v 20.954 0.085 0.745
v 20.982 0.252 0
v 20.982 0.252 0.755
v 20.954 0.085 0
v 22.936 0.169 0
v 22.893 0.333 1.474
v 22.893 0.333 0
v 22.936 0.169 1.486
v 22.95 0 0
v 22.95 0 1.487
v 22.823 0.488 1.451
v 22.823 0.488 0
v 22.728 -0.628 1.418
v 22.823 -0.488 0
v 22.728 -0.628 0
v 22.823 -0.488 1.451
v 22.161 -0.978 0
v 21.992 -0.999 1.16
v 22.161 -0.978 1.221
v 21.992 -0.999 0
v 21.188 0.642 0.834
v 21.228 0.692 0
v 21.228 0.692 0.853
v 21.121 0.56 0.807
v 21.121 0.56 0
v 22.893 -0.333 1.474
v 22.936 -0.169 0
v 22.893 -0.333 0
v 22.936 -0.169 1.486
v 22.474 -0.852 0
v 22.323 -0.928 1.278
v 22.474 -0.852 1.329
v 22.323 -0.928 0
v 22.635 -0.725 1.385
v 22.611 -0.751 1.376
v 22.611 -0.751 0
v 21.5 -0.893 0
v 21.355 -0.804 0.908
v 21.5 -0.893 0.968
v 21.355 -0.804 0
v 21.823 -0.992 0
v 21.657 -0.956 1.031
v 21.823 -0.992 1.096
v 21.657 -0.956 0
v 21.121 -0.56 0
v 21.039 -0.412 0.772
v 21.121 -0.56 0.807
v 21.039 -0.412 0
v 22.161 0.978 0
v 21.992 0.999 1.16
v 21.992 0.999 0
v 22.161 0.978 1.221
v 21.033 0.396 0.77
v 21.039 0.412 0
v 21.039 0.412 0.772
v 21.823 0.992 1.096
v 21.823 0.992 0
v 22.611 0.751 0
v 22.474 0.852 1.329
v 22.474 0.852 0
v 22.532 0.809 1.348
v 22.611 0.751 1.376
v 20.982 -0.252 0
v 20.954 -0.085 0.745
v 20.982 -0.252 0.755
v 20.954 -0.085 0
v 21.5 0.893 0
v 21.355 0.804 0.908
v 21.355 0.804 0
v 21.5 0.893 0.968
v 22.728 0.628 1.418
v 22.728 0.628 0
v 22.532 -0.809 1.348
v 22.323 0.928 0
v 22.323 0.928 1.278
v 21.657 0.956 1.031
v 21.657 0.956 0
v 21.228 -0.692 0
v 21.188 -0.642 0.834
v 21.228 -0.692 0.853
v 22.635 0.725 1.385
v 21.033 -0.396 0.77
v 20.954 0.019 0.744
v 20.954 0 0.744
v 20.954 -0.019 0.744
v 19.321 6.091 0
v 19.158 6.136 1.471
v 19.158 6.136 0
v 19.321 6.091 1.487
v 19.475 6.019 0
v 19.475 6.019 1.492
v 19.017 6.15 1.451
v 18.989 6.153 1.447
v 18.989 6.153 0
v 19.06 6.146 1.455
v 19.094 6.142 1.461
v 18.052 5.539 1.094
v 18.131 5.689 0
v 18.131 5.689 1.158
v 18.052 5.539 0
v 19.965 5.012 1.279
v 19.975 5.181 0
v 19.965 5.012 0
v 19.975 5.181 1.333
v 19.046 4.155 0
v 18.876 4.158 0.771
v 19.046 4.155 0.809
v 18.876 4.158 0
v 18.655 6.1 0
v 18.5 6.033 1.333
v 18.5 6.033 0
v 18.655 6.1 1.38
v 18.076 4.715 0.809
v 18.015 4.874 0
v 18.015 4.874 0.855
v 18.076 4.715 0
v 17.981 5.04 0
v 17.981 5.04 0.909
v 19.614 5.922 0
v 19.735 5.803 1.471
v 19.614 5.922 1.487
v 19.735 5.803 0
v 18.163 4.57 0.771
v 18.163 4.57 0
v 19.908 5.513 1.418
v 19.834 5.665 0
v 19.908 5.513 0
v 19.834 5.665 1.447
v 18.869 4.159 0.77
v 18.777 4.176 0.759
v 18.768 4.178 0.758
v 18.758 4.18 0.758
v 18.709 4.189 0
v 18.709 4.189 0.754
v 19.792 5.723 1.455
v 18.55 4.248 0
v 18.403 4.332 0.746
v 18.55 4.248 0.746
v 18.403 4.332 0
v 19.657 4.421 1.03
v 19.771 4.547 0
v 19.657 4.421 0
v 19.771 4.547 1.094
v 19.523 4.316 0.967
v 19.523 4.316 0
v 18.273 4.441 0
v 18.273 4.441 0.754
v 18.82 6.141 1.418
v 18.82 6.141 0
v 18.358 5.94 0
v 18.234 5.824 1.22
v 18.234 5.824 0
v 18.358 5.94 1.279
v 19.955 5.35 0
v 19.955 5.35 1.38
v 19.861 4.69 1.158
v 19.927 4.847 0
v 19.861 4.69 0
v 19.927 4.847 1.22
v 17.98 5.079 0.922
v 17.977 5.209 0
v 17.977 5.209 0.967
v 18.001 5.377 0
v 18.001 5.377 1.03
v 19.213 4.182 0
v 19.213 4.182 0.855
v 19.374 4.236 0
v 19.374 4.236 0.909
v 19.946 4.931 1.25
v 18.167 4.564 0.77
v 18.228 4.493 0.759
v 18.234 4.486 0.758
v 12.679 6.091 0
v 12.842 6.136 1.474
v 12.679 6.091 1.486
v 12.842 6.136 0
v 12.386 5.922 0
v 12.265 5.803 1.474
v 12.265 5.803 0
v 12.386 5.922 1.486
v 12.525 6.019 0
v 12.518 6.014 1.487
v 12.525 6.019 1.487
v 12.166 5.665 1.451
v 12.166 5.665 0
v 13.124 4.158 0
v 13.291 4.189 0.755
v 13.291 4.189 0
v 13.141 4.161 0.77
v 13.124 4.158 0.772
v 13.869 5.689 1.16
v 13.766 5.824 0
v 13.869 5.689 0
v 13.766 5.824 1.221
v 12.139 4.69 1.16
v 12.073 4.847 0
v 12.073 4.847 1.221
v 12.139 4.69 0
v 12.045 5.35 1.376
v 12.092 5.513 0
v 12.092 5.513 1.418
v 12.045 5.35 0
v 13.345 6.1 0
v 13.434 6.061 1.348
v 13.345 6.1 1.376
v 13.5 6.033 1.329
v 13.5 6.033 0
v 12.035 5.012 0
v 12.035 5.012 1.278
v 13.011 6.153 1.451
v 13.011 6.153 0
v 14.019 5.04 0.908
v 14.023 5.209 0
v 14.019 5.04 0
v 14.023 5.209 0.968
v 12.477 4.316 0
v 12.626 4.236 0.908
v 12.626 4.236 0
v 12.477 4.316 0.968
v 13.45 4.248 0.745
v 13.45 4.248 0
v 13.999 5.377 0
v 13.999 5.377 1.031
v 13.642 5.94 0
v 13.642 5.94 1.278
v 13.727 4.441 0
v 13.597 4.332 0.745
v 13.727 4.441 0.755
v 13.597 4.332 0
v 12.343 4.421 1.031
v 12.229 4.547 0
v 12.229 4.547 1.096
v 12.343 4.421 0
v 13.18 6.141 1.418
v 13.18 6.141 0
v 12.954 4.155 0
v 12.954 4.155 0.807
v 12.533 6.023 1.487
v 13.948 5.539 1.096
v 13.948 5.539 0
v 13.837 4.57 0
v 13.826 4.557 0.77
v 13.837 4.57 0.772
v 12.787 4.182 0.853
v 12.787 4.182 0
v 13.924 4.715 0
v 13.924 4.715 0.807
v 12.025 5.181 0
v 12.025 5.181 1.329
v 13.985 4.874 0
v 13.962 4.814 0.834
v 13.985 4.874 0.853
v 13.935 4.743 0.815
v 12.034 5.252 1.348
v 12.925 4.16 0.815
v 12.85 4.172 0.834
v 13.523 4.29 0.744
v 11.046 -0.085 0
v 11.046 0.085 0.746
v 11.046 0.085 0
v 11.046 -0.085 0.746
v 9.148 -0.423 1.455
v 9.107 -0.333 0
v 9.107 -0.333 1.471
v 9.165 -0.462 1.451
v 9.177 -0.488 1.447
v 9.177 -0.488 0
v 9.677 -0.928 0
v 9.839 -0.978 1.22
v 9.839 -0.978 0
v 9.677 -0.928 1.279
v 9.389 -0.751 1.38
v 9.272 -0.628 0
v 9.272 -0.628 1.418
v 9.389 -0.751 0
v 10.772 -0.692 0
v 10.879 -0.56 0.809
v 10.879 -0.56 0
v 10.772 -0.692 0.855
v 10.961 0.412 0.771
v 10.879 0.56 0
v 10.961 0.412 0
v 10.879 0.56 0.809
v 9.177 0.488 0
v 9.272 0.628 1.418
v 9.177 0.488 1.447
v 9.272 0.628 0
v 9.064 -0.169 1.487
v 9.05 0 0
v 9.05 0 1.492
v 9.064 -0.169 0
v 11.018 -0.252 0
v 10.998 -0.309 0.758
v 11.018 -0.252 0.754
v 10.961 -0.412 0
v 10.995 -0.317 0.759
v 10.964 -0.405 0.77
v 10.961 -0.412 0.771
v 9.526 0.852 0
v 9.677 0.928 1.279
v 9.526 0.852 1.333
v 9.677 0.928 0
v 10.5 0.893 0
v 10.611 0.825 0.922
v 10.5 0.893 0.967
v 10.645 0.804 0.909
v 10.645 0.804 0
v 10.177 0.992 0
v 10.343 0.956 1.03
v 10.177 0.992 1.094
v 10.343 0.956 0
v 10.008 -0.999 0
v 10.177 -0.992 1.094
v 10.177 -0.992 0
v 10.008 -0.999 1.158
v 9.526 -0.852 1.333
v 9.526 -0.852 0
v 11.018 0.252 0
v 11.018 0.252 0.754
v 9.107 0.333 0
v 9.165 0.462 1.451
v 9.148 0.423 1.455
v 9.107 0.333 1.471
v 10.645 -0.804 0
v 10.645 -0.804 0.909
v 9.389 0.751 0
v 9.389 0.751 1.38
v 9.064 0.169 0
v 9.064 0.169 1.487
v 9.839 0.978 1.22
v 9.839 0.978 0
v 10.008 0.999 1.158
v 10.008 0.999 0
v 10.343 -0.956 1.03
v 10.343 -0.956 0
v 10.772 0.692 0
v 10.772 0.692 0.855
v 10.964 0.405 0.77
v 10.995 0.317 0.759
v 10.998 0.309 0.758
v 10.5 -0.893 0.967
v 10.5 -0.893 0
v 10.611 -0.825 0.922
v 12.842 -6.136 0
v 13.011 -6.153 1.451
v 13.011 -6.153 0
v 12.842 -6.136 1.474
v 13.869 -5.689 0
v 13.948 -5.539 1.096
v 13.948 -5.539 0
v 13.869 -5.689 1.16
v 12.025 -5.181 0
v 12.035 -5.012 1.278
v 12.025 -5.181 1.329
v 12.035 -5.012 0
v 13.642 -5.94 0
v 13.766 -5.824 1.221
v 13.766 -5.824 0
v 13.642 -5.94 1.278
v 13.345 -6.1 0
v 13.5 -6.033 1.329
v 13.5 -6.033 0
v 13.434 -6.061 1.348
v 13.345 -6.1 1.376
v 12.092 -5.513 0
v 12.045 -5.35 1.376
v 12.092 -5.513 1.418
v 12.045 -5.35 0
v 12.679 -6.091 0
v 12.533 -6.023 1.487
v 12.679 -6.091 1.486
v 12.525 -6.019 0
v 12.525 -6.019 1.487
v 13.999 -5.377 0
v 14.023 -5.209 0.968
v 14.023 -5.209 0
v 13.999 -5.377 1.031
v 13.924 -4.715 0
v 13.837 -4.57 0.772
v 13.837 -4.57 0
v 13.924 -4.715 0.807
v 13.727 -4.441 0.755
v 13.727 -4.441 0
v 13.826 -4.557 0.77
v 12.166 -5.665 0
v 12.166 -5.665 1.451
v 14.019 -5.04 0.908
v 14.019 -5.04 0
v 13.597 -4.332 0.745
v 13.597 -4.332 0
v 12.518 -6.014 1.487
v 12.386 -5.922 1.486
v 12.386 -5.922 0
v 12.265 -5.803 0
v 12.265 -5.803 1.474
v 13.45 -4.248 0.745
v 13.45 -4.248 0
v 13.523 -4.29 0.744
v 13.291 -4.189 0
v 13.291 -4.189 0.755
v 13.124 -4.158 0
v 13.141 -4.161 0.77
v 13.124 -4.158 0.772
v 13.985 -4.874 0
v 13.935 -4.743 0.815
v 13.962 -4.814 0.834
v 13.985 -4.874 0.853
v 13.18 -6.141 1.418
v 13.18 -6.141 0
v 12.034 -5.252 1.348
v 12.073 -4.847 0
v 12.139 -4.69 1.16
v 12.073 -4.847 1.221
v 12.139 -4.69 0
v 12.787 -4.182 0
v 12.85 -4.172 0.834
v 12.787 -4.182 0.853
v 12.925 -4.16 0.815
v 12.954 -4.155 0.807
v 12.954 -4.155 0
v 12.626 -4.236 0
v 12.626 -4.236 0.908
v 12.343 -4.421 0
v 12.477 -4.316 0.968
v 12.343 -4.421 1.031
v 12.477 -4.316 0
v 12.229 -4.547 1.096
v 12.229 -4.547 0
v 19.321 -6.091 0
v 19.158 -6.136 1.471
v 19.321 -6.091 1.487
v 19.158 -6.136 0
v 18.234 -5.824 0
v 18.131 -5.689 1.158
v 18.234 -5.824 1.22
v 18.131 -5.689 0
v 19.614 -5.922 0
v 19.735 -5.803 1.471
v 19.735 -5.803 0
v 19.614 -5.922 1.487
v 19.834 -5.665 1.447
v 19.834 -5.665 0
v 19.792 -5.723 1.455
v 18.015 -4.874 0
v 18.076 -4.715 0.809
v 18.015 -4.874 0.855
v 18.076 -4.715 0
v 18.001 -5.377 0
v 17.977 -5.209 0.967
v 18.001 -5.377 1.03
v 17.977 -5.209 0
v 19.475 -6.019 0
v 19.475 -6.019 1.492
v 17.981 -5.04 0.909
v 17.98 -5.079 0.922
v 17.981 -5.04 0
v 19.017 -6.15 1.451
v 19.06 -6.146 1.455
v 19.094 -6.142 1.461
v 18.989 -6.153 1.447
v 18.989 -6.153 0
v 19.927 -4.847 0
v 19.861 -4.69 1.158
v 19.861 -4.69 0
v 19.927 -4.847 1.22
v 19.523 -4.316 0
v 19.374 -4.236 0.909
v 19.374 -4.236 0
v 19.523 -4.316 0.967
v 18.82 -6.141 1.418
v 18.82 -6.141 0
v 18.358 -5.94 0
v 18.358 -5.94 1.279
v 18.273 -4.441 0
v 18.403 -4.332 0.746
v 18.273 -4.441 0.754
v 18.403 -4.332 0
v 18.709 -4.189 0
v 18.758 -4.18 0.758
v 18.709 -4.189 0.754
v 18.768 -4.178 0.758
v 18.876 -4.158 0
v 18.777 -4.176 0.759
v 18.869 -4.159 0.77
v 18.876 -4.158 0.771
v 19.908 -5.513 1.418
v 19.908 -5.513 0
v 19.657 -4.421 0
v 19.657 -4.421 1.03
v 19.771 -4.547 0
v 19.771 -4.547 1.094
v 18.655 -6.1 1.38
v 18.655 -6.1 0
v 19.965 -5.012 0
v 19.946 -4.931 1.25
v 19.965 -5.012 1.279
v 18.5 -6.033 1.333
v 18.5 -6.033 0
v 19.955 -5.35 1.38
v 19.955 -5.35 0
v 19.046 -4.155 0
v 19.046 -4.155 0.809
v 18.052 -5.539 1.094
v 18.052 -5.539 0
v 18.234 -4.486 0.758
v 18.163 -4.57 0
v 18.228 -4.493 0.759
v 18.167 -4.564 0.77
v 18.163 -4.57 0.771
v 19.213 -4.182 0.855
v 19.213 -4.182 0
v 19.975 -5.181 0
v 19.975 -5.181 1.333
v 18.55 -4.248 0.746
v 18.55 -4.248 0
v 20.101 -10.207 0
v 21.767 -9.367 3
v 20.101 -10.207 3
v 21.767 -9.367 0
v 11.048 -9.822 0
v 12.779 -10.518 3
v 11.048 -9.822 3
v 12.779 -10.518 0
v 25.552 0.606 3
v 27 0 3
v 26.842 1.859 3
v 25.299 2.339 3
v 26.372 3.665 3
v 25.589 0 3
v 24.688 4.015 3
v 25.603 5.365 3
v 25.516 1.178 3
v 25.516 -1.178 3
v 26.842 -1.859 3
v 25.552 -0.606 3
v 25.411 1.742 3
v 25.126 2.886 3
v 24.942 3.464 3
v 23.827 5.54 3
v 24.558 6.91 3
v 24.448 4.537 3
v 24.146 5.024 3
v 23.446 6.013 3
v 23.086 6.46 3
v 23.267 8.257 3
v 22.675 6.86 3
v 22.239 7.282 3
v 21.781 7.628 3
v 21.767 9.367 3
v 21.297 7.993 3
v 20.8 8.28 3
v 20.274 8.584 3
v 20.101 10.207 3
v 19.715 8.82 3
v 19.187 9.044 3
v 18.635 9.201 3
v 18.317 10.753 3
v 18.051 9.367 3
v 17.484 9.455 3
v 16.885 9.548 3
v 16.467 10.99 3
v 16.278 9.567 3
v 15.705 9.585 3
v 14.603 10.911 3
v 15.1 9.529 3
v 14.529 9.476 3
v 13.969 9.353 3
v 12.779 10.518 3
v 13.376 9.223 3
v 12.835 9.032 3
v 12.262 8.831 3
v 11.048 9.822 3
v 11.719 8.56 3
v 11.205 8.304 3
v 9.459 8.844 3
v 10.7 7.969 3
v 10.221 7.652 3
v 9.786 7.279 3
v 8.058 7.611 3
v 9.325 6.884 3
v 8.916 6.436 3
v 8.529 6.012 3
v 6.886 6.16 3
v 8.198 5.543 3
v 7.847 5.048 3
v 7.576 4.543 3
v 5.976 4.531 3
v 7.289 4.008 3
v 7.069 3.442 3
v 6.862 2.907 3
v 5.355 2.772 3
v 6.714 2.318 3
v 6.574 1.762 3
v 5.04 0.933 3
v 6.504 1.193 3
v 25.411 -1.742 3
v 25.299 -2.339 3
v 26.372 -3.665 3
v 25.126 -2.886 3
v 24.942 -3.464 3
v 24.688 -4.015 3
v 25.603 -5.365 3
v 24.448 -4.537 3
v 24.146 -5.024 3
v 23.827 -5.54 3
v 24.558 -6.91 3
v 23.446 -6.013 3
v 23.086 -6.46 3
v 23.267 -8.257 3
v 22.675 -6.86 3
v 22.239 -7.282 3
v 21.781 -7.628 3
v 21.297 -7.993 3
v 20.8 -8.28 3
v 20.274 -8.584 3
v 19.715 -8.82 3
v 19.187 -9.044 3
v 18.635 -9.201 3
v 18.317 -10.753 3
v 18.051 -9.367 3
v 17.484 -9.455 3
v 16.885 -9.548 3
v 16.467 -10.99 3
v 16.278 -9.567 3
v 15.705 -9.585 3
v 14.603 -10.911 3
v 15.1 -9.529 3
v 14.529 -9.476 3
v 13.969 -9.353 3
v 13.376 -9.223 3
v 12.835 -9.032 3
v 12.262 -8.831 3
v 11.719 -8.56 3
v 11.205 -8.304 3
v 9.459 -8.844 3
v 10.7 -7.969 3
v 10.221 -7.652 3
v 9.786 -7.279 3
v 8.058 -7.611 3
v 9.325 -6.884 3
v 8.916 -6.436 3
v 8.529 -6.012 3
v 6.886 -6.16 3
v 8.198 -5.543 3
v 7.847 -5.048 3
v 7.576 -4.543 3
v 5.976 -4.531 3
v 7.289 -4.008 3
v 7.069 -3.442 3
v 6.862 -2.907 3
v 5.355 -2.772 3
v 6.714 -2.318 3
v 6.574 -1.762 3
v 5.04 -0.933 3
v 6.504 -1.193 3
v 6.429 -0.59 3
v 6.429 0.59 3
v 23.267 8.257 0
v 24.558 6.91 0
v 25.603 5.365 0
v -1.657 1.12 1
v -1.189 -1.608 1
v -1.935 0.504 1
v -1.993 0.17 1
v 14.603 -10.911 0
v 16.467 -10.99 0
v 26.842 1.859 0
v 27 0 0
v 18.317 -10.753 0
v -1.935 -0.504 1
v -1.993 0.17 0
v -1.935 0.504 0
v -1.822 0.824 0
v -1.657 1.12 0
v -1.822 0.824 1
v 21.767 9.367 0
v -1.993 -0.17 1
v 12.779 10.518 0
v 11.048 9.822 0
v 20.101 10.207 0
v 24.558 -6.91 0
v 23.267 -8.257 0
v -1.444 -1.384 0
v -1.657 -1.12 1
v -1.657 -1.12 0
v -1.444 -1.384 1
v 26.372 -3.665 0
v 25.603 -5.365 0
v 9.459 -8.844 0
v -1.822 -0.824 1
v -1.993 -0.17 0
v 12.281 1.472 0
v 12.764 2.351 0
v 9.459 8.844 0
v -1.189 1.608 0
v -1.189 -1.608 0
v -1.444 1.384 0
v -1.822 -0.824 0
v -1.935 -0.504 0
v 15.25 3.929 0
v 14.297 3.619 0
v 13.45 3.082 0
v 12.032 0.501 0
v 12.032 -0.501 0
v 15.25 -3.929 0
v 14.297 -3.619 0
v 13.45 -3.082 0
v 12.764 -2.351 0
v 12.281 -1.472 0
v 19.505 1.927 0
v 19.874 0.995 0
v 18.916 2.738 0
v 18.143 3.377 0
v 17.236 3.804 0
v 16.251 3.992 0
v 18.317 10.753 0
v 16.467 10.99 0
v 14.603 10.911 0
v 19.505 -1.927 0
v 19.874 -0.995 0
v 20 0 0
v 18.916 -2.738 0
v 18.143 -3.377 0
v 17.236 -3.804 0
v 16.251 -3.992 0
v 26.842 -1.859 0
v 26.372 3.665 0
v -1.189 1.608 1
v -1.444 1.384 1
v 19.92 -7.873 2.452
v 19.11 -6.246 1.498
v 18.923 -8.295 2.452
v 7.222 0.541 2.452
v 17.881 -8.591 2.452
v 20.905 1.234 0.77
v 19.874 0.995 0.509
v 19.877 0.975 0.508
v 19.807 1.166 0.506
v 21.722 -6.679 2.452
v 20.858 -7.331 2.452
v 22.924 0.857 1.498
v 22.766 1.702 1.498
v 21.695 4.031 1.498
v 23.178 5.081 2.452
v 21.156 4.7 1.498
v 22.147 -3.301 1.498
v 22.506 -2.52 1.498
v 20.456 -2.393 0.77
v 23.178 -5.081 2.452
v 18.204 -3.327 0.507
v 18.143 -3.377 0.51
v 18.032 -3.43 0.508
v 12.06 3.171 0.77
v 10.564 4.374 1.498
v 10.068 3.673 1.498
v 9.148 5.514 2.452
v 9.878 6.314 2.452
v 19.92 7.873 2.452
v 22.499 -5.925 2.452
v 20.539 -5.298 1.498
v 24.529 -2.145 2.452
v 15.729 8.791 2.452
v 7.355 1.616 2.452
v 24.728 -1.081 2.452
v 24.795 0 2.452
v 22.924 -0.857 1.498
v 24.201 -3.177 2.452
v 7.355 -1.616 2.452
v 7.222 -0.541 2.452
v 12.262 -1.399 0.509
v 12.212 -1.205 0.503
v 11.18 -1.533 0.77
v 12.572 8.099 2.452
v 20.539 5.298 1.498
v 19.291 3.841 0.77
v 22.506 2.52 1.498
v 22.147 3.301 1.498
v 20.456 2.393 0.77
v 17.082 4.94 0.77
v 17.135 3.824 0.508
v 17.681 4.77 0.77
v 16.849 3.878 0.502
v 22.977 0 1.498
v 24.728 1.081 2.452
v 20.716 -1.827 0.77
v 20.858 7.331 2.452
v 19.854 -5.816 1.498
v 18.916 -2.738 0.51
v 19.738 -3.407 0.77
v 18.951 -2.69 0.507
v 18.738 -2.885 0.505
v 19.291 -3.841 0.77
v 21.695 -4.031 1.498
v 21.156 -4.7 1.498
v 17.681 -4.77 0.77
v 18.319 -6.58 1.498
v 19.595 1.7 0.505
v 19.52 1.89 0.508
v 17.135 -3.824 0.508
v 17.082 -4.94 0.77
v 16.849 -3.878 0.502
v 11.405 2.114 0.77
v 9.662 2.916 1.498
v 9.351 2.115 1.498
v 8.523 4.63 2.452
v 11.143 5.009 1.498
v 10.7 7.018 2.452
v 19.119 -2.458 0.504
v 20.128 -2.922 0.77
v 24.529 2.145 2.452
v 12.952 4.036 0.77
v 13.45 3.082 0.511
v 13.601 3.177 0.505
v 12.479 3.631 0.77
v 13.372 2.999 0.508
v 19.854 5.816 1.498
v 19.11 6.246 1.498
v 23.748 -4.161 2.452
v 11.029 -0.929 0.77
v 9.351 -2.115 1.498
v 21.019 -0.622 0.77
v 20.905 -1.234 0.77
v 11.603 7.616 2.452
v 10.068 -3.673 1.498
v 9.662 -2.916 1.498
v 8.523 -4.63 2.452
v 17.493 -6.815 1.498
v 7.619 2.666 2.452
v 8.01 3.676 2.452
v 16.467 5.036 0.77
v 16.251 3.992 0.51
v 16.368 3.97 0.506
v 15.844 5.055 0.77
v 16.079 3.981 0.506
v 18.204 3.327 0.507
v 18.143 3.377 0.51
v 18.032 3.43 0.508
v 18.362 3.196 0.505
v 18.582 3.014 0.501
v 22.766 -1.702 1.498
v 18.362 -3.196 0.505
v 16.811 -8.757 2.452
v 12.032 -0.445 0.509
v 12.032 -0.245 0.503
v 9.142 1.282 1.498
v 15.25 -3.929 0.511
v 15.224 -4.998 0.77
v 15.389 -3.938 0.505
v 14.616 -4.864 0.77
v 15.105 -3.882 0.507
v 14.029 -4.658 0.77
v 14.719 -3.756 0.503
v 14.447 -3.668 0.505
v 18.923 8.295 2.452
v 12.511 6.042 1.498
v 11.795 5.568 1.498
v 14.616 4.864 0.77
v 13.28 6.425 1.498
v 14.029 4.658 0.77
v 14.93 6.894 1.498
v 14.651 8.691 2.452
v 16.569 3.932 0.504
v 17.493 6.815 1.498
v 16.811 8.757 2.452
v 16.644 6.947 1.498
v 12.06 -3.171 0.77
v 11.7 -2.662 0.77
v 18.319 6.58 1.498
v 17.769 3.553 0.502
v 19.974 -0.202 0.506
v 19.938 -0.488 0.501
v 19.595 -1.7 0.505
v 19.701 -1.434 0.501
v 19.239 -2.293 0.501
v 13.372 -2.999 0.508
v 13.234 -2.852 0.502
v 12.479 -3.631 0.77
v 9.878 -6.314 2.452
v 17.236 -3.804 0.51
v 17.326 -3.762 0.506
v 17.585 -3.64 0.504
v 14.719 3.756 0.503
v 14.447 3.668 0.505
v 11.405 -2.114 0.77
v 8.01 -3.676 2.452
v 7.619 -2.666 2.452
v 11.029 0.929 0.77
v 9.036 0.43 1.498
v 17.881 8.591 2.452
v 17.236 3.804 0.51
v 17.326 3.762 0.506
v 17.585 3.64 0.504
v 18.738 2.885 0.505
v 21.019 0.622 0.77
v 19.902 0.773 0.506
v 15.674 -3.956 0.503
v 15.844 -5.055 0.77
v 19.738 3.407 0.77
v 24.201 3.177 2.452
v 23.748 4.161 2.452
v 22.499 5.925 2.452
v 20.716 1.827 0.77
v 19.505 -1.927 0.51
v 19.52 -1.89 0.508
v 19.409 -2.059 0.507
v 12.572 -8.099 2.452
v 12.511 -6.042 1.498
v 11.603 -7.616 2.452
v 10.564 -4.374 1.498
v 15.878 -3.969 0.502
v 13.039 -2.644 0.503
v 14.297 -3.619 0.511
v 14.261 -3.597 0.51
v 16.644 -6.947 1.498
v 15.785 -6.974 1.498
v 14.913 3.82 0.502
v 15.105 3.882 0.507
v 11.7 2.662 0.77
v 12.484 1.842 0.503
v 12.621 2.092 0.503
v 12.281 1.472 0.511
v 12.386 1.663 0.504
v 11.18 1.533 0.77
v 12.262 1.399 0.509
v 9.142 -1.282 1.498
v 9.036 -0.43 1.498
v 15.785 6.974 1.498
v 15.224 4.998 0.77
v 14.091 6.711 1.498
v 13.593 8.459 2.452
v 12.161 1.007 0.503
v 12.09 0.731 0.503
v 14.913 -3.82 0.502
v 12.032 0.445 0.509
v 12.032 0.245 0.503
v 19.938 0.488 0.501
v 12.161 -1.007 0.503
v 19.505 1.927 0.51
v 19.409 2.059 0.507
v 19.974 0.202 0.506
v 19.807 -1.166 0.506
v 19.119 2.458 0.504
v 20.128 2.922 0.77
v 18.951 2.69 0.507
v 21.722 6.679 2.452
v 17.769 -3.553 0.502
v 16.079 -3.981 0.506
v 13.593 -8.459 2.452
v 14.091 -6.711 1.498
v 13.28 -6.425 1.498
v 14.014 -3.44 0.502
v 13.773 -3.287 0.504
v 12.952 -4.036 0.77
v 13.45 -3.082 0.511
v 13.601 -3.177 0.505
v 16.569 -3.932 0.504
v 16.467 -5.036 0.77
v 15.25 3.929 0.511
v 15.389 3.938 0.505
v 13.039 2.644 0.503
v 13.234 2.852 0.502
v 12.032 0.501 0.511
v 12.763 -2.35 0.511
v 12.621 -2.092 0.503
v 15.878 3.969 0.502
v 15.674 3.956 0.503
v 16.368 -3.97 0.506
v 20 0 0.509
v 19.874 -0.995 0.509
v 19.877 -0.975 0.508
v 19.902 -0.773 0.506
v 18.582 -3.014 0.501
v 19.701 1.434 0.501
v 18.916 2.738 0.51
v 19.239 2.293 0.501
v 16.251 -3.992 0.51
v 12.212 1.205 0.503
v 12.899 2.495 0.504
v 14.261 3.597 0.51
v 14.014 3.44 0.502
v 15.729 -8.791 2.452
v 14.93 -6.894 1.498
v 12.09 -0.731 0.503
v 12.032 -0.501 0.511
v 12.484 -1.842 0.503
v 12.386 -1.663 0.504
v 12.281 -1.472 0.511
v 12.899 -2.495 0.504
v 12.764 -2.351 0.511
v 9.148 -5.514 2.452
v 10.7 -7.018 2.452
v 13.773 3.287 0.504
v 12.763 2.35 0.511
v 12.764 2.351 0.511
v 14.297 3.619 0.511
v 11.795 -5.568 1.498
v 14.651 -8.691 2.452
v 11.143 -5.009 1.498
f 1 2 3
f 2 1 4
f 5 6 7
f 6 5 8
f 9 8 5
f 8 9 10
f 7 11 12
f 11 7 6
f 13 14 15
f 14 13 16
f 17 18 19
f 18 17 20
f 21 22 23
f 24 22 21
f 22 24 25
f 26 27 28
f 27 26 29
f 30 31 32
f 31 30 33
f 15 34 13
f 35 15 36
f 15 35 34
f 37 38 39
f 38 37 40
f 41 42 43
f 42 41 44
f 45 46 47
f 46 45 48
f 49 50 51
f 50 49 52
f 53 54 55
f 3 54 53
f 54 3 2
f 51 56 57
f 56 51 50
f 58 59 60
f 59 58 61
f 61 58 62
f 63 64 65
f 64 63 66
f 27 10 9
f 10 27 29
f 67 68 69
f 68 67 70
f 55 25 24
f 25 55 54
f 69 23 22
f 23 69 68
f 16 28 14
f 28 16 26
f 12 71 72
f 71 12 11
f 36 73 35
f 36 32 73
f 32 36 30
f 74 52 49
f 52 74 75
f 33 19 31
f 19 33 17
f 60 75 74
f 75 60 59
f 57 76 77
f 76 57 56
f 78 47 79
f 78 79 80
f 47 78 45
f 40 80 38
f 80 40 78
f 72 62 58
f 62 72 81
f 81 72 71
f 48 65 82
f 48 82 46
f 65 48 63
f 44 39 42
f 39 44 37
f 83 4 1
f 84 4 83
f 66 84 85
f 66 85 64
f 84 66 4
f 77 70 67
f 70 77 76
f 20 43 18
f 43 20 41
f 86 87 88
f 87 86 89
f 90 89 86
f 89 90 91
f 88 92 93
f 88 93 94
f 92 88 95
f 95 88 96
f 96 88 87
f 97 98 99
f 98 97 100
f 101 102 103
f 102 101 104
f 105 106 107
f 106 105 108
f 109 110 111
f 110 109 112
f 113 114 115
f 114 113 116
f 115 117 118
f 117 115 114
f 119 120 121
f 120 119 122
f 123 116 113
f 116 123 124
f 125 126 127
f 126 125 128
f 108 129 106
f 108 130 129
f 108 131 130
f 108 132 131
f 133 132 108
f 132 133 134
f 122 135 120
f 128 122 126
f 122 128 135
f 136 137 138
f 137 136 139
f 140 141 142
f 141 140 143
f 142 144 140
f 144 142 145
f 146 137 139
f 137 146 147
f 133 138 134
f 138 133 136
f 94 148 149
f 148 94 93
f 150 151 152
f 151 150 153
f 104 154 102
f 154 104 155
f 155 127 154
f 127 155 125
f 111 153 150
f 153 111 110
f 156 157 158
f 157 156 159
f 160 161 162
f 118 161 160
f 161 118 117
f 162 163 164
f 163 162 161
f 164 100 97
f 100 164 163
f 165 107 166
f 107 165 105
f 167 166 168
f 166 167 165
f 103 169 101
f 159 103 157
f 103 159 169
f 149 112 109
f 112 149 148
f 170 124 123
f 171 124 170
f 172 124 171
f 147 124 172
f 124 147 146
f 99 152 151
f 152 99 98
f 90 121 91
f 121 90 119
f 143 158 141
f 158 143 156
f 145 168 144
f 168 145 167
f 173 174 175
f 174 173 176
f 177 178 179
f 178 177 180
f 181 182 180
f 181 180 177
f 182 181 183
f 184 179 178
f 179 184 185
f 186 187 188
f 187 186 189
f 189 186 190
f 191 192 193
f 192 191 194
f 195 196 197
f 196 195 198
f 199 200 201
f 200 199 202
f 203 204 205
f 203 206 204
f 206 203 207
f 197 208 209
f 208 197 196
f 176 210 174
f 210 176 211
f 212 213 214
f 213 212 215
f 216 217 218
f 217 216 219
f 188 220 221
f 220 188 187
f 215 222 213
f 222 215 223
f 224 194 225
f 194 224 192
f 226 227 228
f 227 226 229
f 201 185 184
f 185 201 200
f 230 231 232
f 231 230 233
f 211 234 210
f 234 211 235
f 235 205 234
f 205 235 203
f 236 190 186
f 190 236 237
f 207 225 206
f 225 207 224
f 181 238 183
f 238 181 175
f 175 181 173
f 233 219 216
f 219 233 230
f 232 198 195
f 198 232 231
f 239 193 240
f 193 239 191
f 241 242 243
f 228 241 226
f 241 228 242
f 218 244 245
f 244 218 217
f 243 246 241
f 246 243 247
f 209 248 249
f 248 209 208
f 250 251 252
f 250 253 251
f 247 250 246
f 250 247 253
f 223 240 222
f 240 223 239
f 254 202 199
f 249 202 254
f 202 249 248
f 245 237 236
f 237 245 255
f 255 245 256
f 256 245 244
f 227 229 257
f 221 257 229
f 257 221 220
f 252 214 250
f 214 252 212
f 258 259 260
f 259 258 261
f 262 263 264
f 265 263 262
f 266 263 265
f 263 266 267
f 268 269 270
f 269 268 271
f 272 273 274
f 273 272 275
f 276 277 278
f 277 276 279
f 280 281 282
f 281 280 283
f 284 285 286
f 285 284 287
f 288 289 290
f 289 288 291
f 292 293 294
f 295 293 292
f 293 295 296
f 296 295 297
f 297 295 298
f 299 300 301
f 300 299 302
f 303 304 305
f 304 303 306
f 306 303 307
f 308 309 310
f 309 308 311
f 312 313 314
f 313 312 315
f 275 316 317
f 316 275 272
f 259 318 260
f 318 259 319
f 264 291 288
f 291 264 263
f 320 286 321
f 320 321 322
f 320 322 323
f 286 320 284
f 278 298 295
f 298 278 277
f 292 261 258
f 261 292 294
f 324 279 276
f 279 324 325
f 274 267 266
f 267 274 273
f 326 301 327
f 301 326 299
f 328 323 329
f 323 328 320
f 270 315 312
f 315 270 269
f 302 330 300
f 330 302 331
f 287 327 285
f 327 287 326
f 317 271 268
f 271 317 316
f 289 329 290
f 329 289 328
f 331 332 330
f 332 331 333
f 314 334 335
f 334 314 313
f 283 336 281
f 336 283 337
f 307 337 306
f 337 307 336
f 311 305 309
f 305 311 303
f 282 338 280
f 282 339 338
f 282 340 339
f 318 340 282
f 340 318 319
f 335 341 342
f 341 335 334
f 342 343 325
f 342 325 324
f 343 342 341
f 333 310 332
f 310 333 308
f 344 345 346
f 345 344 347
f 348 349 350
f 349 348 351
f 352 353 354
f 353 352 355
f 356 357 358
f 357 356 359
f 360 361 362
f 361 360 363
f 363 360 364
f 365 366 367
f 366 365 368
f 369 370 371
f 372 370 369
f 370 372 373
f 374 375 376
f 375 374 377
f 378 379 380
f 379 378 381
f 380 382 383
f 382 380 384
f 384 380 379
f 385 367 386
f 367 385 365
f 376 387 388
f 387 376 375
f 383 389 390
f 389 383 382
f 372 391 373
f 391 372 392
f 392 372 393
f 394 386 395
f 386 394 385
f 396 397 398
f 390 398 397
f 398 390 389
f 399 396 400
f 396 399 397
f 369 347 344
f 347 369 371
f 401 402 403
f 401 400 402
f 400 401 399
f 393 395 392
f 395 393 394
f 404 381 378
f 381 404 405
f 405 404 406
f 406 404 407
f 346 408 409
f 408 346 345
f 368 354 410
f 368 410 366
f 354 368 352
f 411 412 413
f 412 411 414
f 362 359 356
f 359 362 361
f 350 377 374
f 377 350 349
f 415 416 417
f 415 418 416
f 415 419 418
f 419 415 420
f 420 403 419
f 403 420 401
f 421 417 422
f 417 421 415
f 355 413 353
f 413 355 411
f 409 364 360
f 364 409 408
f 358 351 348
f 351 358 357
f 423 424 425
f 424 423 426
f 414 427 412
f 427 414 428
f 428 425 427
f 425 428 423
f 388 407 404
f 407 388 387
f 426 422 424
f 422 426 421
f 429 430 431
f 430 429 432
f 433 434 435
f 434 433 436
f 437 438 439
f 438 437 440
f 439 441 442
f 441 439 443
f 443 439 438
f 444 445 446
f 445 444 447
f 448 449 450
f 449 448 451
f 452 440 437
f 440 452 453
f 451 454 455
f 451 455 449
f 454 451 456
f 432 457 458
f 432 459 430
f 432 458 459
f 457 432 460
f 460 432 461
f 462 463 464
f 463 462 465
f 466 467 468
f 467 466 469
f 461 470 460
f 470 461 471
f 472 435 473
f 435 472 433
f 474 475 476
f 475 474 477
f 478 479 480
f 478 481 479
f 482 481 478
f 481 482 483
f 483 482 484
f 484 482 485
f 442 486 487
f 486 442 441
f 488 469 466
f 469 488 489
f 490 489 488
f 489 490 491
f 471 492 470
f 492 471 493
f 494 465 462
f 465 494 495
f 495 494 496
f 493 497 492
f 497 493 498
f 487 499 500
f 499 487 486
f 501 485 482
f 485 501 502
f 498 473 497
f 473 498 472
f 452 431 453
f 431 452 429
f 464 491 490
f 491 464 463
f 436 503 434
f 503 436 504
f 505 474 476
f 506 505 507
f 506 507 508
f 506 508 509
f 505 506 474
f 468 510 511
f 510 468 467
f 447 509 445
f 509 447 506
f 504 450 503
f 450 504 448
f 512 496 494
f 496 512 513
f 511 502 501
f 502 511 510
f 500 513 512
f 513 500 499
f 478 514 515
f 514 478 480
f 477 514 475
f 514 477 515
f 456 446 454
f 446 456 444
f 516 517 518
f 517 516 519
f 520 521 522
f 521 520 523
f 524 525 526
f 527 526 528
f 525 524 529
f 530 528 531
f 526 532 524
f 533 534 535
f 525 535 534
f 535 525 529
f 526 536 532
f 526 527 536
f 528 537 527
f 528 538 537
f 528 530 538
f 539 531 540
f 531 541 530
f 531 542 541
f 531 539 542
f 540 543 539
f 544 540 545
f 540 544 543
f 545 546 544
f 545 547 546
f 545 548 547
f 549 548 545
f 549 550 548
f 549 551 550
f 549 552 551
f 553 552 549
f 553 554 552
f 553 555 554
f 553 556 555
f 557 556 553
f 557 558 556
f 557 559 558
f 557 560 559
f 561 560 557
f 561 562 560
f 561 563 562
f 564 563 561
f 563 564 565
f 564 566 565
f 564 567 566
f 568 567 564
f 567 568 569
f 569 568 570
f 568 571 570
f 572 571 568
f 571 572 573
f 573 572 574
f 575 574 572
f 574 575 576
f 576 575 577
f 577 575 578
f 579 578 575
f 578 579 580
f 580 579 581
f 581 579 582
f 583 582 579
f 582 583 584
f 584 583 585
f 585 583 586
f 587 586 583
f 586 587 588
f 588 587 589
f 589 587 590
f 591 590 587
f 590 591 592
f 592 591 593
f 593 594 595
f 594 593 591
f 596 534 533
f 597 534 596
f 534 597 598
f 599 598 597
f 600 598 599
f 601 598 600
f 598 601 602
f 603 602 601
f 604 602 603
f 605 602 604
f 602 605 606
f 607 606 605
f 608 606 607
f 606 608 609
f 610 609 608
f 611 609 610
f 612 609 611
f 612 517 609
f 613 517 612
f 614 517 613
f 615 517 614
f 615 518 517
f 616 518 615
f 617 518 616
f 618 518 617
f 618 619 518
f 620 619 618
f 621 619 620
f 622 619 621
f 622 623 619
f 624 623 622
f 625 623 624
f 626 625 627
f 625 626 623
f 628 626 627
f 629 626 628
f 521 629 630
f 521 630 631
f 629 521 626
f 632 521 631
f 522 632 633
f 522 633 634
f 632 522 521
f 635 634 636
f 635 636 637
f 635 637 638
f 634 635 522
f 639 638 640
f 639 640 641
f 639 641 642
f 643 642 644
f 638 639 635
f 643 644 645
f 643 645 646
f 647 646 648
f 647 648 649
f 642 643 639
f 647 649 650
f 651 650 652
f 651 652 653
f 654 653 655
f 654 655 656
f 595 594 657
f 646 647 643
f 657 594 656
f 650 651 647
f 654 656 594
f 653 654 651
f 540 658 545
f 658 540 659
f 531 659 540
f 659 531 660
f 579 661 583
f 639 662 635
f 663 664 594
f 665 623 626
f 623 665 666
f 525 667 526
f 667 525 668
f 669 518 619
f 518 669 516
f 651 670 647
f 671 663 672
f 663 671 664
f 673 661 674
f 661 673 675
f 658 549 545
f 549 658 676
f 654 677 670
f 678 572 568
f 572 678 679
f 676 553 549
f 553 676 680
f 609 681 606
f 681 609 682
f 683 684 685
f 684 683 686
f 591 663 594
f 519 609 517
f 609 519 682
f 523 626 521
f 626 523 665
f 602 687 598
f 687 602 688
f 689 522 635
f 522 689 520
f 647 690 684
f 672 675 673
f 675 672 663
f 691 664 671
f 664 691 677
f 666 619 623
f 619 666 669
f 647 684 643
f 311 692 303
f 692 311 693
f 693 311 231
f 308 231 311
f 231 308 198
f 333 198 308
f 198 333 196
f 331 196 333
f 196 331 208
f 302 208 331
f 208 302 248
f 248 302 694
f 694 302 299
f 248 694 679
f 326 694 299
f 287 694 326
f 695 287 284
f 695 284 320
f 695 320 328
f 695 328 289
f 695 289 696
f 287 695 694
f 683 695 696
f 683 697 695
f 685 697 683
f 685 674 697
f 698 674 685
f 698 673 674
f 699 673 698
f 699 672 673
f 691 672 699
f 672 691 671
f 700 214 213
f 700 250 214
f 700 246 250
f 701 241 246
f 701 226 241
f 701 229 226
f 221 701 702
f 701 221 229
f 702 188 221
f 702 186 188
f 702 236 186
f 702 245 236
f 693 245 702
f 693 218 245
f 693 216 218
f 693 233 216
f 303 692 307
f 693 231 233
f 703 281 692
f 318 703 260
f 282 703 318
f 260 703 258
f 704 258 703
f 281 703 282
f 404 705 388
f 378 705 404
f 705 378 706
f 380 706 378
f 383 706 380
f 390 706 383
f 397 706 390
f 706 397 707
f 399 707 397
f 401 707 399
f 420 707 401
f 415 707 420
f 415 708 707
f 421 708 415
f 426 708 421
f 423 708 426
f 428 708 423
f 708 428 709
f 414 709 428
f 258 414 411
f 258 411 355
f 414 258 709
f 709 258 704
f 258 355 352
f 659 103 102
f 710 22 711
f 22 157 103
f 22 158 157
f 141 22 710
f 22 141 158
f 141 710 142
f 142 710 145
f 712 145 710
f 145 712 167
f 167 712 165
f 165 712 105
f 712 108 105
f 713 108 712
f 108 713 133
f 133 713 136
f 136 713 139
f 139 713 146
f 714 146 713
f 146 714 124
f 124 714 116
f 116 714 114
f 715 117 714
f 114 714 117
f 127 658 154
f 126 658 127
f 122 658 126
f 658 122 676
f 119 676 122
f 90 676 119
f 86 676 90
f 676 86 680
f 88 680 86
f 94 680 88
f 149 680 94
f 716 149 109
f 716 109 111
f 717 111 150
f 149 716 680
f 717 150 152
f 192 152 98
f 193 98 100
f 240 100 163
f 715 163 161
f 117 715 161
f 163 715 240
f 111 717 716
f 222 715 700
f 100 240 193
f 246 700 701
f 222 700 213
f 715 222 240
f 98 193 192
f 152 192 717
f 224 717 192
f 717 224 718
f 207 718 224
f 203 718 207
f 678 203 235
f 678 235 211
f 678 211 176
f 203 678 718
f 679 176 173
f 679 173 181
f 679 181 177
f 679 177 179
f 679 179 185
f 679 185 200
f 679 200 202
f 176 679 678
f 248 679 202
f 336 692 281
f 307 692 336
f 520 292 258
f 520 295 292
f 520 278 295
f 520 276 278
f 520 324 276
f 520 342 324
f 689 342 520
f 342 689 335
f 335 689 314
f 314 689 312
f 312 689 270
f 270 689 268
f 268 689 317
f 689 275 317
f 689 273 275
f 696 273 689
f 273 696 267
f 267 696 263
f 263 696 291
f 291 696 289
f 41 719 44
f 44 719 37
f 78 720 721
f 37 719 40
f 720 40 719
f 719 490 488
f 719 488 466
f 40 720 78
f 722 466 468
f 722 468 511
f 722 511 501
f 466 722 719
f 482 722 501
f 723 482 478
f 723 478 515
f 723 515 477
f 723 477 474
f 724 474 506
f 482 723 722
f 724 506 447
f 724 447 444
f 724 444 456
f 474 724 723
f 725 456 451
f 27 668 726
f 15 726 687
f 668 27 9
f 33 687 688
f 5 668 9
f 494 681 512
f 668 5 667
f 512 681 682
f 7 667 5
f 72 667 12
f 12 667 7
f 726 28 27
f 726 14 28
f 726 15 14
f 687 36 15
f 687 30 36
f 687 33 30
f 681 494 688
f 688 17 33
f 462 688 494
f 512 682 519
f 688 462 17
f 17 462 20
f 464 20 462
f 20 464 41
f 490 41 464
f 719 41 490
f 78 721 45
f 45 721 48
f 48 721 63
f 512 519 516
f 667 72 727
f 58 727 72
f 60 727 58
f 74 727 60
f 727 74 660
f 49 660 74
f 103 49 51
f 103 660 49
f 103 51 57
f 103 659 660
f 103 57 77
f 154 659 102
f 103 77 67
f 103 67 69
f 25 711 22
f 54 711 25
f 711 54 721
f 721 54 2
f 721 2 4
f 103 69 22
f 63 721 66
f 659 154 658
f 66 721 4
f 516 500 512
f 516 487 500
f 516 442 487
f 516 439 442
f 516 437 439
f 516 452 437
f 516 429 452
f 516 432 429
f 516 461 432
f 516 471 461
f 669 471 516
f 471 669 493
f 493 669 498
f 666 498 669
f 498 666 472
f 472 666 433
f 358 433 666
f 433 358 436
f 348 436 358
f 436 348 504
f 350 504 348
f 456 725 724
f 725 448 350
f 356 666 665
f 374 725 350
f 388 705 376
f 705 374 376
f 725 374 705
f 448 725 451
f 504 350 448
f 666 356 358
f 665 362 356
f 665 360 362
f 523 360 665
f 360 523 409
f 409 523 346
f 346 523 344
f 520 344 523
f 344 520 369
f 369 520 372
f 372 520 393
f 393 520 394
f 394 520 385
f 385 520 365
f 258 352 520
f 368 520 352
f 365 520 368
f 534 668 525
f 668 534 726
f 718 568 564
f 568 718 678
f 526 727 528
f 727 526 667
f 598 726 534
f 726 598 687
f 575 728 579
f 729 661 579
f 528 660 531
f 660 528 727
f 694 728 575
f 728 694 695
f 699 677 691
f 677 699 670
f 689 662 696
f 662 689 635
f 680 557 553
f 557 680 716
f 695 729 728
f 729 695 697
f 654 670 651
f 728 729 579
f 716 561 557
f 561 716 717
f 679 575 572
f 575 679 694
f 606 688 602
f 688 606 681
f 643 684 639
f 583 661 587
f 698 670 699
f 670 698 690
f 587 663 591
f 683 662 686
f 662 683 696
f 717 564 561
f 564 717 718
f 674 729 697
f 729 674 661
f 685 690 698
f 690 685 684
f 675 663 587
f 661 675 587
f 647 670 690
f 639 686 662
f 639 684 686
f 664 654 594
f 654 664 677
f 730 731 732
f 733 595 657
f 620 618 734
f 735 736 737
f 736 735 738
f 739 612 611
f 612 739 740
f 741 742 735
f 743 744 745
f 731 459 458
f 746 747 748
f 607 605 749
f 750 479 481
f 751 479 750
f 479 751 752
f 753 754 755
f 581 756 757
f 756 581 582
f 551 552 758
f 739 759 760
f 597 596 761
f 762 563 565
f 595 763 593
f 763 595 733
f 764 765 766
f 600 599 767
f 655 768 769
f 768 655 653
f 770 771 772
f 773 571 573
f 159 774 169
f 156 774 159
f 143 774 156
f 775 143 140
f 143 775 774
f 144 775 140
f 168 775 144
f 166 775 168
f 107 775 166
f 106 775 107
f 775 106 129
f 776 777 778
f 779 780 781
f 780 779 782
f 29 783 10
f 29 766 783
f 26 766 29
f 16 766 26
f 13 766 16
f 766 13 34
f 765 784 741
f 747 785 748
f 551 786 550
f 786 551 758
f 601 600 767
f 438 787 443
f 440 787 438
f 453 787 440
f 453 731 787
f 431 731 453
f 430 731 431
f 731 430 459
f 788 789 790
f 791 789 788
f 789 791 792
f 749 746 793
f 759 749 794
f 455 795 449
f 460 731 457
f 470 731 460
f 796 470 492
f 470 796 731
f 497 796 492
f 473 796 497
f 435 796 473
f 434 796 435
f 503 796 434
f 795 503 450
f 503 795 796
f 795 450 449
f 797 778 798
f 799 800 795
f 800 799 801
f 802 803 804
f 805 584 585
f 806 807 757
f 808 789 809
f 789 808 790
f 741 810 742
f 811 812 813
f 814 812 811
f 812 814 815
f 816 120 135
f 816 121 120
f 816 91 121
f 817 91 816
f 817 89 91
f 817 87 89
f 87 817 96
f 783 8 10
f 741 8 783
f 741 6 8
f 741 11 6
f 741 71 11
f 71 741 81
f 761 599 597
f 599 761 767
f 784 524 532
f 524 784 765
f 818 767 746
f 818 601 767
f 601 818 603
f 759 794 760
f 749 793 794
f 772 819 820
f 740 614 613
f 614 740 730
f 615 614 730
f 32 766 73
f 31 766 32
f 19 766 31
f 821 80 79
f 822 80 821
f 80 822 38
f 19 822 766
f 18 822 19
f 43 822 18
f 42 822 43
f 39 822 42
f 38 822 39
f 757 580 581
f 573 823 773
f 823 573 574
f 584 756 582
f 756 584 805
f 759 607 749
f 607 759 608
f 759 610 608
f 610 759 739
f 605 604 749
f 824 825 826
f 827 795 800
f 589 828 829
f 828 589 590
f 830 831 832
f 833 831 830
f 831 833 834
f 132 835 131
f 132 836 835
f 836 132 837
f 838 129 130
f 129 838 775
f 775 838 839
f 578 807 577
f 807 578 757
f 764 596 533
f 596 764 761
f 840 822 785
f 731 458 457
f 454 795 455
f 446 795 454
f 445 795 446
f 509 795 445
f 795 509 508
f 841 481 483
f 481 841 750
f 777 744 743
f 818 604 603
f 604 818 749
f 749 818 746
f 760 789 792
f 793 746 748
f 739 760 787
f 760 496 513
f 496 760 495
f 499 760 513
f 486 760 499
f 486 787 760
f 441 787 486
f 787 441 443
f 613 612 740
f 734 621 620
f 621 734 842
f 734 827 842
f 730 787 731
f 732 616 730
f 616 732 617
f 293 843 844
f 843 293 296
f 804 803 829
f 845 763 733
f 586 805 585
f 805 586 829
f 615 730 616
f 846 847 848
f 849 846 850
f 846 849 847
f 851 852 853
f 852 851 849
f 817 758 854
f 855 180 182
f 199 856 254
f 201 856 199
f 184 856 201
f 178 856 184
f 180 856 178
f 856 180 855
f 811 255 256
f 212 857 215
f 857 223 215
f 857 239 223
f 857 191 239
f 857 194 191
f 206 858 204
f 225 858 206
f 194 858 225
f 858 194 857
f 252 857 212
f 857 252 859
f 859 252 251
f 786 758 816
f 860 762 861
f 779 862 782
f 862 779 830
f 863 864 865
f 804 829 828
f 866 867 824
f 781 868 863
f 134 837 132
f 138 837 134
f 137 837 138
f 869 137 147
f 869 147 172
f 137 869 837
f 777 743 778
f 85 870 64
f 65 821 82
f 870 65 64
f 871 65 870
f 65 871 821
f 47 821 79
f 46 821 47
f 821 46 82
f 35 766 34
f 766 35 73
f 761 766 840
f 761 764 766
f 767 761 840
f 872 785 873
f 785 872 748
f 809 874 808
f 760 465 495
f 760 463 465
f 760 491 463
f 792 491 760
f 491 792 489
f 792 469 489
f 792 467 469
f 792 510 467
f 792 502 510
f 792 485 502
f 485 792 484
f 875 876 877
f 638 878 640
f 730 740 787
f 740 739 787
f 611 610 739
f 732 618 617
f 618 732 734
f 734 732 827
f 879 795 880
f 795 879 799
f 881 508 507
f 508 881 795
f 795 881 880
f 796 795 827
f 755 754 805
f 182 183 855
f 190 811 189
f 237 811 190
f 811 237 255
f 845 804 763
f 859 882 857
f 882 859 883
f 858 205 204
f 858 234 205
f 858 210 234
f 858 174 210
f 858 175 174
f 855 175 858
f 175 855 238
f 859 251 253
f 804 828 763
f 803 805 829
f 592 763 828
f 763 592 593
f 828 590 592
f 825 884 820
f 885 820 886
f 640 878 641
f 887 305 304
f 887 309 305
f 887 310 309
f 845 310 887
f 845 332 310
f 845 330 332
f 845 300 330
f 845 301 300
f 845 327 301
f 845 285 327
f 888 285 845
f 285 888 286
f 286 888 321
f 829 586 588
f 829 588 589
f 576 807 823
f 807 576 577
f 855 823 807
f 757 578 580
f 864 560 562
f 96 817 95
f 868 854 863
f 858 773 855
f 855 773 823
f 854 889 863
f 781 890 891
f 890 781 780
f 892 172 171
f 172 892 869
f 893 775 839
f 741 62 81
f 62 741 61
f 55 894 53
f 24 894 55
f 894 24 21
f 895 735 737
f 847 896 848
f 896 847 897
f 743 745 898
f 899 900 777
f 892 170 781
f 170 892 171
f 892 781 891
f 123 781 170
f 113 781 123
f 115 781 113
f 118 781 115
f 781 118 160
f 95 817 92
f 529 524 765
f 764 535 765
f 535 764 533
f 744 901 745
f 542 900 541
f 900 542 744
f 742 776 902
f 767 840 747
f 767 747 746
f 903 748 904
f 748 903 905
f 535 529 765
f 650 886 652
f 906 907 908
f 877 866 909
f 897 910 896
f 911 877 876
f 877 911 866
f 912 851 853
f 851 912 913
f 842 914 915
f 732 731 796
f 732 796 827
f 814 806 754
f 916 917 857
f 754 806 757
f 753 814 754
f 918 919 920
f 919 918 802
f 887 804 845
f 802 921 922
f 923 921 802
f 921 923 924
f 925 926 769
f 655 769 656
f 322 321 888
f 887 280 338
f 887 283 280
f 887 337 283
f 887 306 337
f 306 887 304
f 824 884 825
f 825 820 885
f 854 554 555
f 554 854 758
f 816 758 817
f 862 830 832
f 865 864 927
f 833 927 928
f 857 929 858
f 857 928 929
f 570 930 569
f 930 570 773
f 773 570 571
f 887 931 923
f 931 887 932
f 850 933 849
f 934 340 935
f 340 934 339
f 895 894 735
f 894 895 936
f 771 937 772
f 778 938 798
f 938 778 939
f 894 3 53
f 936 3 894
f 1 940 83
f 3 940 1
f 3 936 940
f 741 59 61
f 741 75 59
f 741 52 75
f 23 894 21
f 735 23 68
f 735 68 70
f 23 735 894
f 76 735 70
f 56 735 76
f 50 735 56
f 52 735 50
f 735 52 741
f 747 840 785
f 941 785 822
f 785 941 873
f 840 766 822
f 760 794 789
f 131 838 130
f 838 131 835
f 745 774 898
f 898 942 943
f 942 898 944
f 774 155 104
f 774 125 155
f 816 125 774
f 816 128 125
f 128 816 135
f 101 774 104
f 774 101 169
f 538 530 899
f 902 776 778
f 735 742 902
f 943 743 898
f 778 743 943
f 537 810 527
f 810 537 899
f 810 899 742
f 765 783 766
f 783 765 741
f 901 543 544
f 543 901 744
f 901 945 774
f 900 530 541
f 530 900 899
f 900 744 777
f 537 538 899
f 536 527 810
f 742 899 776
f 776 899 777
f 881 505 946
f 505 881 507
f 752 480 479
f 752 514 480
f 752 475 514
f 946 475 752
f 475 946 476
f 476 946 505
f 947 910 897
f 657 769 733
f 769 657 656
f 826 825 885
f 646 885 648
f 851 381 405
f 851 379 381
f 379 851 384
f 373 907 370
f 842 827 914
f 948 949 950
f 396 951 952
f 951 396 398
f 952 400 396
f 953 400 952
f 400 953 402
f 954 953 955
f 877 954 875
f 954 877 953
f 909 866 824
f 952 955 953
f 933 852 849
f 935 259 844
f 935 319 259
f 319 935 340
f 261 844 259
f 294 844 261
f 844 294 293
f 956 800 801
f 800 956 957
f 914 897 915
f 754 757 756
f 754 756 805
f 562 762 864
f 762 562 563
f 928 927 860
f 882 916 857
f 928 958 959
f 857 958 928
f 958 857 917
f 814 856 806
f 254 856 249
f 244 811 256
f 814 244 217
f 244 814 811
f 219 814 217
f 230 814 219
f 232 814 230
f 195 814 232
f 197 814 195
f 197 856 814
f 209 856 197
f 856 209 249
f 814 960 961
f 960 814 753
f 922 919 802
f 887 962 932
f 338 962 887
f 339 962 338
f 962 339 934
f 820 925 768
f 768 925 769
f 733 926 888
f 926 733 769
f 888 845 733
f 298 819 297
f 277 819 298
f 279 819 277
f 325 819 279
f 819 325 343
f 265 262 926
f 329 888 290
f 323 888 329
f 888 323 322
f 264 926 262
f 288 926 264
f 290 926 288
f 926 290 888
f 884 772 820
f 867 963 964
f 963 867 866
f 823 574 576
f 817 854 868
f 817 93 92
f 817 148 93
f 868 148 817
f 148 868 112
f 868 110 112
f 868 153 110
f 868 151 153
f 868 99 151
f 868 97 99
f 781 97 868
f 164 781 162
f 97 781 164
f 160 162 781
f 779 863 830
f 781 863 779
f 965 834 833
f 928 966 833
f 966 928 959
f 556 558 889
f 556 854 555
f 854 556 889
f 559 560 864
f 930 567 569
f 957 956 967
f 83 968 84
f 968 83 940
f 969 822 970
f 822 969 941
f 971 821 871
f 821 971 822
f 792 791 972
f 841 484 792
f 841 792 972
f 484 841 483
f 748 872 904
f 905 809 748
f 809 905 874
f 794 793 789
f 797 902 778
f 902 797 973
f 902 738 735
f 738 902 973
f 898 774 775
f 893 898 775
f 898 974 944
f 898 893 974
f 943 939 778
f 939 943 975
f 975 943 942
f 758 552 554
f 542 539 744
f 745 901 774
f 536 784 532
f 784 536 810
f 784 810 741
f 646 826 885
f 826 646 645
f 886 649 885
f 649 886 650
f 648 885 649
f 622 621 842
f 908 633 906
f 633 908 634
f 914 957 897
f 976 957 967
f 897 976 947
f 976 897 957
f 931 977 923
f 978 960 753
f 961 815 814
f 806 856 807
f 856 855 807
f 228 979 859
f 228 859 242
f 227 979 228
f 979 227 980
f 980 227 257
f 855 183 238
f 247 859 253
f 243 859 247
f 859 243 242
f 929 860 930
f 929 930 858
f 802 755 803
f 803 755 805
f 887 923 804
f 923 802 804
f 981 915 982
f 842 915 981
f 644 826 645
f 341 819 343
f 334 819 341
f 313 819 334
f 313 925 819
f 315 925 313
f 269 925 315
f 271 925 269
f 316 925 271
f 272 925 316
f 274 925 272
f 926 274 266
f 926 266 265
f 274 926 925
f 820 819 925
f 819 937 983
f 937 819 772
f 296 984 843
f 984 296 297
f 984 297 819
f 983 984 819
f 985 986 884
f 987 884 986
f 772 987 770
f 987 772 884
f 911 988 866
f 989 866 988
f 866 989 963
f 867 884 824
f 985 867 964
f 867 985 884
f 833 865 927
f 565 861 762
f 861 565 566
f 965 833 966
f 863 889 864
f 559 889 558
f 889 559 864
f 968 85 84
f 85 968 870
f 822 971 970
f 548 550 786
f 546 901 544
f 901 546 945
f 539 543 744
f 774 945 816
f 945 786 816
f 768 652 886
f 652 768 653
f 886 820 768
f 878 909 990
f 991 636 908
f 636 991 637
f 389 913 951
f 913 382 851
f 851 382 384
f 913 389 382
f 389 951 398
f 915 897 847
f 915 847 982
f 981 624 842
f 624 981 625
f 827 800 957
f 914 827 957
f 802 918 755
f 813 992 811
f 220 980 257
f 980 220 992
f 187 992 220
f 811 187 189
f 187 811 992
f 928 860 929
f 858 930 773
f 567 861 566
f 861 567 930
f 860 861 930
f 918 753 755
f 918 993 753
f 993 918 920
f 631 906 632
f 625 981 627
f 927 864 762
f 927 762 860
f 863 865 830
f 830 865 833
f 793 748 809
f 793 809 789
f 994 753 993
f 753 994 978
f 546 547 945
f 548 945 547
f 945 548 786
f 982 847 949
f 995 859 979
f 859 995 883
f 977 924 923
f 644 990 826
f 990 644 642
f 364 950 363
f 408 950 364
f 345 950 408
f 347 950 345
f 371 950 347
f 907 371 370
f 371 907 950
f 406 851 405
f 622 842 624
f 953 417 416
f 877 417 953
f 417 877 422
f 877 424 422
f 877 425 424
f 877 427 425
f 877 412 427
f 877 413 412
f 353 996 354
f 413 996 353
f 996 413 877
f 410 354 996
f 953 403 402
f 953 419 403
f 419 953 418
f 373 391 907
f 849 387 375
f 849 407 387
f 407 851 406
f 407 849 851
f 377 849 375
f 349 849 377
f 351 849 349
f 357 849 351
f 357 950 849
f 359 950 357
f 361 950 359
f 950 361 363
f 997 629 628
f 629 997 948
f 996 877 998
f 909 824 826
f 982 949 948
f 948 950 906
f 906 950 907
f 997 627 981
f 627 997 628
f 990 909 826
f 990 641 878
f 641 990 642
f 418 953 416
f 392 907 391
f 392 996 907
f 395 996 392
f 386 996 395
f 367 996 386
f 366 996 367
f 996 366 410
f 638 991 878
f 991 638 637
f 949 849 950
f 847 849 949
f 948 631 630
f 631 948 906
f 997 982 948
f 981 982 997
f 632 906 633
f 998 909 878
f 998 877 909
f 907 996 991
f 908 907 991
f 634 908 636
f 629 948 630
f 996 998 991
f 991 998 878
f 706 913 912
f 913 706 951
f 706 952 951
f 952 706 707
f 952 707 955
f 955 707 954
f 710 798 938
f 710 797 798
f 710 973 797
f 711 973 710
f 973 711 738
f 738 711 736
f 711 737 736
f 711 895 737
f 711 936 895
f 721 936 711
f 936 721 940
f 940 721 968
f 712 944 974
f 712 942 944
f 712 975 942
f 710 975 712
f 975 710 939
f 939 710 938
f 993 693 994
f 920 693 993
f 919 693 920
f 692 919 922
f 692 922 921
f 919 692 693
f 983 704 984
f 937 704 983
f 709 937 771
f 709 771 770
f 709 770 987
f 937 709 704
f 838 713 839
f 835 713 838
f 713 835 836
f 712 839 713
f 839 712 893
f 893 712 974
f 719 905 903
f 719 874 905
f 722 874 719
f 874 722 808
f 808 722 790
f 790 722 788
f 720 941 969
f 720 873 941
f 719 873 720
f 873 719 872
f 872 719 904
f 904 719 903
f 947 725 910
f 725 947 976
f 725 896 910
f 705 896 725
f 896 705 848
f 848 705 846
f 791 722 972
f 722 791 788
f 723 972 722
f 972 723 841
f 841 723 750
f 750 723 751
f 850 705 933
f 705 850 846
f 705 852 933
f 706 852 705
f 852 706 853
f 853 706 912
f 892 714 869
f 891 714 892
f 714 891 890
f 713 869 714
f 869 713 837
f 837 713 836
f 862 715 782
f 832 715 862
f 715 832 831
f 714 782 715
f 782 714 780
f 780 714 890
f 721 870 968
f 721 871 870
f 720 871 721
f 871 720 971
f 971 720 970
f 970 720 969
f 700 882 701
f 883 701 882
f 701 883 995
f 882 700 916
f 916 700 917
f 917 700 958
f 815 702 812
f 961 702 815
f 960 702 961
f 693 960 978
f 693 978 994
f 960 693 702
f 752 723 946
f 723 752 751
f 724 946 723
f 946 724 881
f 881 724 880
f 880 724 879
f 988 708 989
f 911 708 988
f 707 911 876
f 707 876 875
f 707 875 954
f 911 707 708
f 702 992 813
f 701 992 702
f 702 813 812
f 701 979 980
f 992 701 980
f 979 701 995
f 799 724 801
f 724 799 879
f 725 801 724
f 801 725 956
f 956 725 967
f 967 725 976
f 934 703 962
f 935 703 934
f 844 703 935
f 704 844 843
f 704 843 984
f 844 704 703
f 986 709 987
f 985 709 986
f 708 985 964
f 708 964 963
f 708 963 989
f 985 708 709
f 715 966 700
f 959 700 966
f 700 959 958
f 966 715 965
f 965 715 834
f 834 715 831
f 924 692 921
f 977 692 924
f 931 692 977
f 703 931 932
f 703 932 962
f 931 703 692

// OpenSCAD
/*
    Guitar Pick.

    Copyright 2014, Peter and Tim Molteno. tim@molteno.net
  
    This program is free software: you can redistribute it and/or modify
    it under the terms of the GNU General Public License as published by
    the Free Software Foundation, either version 3 of the License, or
    (at your option) any later version.

    This program is distributed in the hope that it will be useful,
    but WITHOUT ANY WARRANTY; without even the implied warranty of
    MERCHANTABILITY or FITNESS FOR A PARTICULAR PURPOSE.  See the
    GNU General Public License for more details.

    You should have received a copy of the GNU General Public License
    along with this program.  If not, see <http://www.gnu.org/licenses/>.
*/
$fn = 37;
pick_length = 16;
tip_radius = 2;
hold_radius = 11;

module pick() {
  hull() {
    translate([0,0,0.0]) cylinder(r=tip_radius,h=1);
    translate([pick_length,0,0]) cylinder(r=hold_radius,h=3);
  }
}

difference() {
  pick();

  // Now decorate the pick with some features.
  translate([pick_length,0,17]) sphere(r=17, center=true, $fn=51);
  translate([pick_length,0,]) cylinder(r=4, h=10, center=true, $fn=25);
  translate([pick_length,0,]) {
    for (angle = [0:60:300]) {
      rotate(angle) translate([5.95,0,0]) cylinder(r=1, h=5, center=true);
    }
  }
}
